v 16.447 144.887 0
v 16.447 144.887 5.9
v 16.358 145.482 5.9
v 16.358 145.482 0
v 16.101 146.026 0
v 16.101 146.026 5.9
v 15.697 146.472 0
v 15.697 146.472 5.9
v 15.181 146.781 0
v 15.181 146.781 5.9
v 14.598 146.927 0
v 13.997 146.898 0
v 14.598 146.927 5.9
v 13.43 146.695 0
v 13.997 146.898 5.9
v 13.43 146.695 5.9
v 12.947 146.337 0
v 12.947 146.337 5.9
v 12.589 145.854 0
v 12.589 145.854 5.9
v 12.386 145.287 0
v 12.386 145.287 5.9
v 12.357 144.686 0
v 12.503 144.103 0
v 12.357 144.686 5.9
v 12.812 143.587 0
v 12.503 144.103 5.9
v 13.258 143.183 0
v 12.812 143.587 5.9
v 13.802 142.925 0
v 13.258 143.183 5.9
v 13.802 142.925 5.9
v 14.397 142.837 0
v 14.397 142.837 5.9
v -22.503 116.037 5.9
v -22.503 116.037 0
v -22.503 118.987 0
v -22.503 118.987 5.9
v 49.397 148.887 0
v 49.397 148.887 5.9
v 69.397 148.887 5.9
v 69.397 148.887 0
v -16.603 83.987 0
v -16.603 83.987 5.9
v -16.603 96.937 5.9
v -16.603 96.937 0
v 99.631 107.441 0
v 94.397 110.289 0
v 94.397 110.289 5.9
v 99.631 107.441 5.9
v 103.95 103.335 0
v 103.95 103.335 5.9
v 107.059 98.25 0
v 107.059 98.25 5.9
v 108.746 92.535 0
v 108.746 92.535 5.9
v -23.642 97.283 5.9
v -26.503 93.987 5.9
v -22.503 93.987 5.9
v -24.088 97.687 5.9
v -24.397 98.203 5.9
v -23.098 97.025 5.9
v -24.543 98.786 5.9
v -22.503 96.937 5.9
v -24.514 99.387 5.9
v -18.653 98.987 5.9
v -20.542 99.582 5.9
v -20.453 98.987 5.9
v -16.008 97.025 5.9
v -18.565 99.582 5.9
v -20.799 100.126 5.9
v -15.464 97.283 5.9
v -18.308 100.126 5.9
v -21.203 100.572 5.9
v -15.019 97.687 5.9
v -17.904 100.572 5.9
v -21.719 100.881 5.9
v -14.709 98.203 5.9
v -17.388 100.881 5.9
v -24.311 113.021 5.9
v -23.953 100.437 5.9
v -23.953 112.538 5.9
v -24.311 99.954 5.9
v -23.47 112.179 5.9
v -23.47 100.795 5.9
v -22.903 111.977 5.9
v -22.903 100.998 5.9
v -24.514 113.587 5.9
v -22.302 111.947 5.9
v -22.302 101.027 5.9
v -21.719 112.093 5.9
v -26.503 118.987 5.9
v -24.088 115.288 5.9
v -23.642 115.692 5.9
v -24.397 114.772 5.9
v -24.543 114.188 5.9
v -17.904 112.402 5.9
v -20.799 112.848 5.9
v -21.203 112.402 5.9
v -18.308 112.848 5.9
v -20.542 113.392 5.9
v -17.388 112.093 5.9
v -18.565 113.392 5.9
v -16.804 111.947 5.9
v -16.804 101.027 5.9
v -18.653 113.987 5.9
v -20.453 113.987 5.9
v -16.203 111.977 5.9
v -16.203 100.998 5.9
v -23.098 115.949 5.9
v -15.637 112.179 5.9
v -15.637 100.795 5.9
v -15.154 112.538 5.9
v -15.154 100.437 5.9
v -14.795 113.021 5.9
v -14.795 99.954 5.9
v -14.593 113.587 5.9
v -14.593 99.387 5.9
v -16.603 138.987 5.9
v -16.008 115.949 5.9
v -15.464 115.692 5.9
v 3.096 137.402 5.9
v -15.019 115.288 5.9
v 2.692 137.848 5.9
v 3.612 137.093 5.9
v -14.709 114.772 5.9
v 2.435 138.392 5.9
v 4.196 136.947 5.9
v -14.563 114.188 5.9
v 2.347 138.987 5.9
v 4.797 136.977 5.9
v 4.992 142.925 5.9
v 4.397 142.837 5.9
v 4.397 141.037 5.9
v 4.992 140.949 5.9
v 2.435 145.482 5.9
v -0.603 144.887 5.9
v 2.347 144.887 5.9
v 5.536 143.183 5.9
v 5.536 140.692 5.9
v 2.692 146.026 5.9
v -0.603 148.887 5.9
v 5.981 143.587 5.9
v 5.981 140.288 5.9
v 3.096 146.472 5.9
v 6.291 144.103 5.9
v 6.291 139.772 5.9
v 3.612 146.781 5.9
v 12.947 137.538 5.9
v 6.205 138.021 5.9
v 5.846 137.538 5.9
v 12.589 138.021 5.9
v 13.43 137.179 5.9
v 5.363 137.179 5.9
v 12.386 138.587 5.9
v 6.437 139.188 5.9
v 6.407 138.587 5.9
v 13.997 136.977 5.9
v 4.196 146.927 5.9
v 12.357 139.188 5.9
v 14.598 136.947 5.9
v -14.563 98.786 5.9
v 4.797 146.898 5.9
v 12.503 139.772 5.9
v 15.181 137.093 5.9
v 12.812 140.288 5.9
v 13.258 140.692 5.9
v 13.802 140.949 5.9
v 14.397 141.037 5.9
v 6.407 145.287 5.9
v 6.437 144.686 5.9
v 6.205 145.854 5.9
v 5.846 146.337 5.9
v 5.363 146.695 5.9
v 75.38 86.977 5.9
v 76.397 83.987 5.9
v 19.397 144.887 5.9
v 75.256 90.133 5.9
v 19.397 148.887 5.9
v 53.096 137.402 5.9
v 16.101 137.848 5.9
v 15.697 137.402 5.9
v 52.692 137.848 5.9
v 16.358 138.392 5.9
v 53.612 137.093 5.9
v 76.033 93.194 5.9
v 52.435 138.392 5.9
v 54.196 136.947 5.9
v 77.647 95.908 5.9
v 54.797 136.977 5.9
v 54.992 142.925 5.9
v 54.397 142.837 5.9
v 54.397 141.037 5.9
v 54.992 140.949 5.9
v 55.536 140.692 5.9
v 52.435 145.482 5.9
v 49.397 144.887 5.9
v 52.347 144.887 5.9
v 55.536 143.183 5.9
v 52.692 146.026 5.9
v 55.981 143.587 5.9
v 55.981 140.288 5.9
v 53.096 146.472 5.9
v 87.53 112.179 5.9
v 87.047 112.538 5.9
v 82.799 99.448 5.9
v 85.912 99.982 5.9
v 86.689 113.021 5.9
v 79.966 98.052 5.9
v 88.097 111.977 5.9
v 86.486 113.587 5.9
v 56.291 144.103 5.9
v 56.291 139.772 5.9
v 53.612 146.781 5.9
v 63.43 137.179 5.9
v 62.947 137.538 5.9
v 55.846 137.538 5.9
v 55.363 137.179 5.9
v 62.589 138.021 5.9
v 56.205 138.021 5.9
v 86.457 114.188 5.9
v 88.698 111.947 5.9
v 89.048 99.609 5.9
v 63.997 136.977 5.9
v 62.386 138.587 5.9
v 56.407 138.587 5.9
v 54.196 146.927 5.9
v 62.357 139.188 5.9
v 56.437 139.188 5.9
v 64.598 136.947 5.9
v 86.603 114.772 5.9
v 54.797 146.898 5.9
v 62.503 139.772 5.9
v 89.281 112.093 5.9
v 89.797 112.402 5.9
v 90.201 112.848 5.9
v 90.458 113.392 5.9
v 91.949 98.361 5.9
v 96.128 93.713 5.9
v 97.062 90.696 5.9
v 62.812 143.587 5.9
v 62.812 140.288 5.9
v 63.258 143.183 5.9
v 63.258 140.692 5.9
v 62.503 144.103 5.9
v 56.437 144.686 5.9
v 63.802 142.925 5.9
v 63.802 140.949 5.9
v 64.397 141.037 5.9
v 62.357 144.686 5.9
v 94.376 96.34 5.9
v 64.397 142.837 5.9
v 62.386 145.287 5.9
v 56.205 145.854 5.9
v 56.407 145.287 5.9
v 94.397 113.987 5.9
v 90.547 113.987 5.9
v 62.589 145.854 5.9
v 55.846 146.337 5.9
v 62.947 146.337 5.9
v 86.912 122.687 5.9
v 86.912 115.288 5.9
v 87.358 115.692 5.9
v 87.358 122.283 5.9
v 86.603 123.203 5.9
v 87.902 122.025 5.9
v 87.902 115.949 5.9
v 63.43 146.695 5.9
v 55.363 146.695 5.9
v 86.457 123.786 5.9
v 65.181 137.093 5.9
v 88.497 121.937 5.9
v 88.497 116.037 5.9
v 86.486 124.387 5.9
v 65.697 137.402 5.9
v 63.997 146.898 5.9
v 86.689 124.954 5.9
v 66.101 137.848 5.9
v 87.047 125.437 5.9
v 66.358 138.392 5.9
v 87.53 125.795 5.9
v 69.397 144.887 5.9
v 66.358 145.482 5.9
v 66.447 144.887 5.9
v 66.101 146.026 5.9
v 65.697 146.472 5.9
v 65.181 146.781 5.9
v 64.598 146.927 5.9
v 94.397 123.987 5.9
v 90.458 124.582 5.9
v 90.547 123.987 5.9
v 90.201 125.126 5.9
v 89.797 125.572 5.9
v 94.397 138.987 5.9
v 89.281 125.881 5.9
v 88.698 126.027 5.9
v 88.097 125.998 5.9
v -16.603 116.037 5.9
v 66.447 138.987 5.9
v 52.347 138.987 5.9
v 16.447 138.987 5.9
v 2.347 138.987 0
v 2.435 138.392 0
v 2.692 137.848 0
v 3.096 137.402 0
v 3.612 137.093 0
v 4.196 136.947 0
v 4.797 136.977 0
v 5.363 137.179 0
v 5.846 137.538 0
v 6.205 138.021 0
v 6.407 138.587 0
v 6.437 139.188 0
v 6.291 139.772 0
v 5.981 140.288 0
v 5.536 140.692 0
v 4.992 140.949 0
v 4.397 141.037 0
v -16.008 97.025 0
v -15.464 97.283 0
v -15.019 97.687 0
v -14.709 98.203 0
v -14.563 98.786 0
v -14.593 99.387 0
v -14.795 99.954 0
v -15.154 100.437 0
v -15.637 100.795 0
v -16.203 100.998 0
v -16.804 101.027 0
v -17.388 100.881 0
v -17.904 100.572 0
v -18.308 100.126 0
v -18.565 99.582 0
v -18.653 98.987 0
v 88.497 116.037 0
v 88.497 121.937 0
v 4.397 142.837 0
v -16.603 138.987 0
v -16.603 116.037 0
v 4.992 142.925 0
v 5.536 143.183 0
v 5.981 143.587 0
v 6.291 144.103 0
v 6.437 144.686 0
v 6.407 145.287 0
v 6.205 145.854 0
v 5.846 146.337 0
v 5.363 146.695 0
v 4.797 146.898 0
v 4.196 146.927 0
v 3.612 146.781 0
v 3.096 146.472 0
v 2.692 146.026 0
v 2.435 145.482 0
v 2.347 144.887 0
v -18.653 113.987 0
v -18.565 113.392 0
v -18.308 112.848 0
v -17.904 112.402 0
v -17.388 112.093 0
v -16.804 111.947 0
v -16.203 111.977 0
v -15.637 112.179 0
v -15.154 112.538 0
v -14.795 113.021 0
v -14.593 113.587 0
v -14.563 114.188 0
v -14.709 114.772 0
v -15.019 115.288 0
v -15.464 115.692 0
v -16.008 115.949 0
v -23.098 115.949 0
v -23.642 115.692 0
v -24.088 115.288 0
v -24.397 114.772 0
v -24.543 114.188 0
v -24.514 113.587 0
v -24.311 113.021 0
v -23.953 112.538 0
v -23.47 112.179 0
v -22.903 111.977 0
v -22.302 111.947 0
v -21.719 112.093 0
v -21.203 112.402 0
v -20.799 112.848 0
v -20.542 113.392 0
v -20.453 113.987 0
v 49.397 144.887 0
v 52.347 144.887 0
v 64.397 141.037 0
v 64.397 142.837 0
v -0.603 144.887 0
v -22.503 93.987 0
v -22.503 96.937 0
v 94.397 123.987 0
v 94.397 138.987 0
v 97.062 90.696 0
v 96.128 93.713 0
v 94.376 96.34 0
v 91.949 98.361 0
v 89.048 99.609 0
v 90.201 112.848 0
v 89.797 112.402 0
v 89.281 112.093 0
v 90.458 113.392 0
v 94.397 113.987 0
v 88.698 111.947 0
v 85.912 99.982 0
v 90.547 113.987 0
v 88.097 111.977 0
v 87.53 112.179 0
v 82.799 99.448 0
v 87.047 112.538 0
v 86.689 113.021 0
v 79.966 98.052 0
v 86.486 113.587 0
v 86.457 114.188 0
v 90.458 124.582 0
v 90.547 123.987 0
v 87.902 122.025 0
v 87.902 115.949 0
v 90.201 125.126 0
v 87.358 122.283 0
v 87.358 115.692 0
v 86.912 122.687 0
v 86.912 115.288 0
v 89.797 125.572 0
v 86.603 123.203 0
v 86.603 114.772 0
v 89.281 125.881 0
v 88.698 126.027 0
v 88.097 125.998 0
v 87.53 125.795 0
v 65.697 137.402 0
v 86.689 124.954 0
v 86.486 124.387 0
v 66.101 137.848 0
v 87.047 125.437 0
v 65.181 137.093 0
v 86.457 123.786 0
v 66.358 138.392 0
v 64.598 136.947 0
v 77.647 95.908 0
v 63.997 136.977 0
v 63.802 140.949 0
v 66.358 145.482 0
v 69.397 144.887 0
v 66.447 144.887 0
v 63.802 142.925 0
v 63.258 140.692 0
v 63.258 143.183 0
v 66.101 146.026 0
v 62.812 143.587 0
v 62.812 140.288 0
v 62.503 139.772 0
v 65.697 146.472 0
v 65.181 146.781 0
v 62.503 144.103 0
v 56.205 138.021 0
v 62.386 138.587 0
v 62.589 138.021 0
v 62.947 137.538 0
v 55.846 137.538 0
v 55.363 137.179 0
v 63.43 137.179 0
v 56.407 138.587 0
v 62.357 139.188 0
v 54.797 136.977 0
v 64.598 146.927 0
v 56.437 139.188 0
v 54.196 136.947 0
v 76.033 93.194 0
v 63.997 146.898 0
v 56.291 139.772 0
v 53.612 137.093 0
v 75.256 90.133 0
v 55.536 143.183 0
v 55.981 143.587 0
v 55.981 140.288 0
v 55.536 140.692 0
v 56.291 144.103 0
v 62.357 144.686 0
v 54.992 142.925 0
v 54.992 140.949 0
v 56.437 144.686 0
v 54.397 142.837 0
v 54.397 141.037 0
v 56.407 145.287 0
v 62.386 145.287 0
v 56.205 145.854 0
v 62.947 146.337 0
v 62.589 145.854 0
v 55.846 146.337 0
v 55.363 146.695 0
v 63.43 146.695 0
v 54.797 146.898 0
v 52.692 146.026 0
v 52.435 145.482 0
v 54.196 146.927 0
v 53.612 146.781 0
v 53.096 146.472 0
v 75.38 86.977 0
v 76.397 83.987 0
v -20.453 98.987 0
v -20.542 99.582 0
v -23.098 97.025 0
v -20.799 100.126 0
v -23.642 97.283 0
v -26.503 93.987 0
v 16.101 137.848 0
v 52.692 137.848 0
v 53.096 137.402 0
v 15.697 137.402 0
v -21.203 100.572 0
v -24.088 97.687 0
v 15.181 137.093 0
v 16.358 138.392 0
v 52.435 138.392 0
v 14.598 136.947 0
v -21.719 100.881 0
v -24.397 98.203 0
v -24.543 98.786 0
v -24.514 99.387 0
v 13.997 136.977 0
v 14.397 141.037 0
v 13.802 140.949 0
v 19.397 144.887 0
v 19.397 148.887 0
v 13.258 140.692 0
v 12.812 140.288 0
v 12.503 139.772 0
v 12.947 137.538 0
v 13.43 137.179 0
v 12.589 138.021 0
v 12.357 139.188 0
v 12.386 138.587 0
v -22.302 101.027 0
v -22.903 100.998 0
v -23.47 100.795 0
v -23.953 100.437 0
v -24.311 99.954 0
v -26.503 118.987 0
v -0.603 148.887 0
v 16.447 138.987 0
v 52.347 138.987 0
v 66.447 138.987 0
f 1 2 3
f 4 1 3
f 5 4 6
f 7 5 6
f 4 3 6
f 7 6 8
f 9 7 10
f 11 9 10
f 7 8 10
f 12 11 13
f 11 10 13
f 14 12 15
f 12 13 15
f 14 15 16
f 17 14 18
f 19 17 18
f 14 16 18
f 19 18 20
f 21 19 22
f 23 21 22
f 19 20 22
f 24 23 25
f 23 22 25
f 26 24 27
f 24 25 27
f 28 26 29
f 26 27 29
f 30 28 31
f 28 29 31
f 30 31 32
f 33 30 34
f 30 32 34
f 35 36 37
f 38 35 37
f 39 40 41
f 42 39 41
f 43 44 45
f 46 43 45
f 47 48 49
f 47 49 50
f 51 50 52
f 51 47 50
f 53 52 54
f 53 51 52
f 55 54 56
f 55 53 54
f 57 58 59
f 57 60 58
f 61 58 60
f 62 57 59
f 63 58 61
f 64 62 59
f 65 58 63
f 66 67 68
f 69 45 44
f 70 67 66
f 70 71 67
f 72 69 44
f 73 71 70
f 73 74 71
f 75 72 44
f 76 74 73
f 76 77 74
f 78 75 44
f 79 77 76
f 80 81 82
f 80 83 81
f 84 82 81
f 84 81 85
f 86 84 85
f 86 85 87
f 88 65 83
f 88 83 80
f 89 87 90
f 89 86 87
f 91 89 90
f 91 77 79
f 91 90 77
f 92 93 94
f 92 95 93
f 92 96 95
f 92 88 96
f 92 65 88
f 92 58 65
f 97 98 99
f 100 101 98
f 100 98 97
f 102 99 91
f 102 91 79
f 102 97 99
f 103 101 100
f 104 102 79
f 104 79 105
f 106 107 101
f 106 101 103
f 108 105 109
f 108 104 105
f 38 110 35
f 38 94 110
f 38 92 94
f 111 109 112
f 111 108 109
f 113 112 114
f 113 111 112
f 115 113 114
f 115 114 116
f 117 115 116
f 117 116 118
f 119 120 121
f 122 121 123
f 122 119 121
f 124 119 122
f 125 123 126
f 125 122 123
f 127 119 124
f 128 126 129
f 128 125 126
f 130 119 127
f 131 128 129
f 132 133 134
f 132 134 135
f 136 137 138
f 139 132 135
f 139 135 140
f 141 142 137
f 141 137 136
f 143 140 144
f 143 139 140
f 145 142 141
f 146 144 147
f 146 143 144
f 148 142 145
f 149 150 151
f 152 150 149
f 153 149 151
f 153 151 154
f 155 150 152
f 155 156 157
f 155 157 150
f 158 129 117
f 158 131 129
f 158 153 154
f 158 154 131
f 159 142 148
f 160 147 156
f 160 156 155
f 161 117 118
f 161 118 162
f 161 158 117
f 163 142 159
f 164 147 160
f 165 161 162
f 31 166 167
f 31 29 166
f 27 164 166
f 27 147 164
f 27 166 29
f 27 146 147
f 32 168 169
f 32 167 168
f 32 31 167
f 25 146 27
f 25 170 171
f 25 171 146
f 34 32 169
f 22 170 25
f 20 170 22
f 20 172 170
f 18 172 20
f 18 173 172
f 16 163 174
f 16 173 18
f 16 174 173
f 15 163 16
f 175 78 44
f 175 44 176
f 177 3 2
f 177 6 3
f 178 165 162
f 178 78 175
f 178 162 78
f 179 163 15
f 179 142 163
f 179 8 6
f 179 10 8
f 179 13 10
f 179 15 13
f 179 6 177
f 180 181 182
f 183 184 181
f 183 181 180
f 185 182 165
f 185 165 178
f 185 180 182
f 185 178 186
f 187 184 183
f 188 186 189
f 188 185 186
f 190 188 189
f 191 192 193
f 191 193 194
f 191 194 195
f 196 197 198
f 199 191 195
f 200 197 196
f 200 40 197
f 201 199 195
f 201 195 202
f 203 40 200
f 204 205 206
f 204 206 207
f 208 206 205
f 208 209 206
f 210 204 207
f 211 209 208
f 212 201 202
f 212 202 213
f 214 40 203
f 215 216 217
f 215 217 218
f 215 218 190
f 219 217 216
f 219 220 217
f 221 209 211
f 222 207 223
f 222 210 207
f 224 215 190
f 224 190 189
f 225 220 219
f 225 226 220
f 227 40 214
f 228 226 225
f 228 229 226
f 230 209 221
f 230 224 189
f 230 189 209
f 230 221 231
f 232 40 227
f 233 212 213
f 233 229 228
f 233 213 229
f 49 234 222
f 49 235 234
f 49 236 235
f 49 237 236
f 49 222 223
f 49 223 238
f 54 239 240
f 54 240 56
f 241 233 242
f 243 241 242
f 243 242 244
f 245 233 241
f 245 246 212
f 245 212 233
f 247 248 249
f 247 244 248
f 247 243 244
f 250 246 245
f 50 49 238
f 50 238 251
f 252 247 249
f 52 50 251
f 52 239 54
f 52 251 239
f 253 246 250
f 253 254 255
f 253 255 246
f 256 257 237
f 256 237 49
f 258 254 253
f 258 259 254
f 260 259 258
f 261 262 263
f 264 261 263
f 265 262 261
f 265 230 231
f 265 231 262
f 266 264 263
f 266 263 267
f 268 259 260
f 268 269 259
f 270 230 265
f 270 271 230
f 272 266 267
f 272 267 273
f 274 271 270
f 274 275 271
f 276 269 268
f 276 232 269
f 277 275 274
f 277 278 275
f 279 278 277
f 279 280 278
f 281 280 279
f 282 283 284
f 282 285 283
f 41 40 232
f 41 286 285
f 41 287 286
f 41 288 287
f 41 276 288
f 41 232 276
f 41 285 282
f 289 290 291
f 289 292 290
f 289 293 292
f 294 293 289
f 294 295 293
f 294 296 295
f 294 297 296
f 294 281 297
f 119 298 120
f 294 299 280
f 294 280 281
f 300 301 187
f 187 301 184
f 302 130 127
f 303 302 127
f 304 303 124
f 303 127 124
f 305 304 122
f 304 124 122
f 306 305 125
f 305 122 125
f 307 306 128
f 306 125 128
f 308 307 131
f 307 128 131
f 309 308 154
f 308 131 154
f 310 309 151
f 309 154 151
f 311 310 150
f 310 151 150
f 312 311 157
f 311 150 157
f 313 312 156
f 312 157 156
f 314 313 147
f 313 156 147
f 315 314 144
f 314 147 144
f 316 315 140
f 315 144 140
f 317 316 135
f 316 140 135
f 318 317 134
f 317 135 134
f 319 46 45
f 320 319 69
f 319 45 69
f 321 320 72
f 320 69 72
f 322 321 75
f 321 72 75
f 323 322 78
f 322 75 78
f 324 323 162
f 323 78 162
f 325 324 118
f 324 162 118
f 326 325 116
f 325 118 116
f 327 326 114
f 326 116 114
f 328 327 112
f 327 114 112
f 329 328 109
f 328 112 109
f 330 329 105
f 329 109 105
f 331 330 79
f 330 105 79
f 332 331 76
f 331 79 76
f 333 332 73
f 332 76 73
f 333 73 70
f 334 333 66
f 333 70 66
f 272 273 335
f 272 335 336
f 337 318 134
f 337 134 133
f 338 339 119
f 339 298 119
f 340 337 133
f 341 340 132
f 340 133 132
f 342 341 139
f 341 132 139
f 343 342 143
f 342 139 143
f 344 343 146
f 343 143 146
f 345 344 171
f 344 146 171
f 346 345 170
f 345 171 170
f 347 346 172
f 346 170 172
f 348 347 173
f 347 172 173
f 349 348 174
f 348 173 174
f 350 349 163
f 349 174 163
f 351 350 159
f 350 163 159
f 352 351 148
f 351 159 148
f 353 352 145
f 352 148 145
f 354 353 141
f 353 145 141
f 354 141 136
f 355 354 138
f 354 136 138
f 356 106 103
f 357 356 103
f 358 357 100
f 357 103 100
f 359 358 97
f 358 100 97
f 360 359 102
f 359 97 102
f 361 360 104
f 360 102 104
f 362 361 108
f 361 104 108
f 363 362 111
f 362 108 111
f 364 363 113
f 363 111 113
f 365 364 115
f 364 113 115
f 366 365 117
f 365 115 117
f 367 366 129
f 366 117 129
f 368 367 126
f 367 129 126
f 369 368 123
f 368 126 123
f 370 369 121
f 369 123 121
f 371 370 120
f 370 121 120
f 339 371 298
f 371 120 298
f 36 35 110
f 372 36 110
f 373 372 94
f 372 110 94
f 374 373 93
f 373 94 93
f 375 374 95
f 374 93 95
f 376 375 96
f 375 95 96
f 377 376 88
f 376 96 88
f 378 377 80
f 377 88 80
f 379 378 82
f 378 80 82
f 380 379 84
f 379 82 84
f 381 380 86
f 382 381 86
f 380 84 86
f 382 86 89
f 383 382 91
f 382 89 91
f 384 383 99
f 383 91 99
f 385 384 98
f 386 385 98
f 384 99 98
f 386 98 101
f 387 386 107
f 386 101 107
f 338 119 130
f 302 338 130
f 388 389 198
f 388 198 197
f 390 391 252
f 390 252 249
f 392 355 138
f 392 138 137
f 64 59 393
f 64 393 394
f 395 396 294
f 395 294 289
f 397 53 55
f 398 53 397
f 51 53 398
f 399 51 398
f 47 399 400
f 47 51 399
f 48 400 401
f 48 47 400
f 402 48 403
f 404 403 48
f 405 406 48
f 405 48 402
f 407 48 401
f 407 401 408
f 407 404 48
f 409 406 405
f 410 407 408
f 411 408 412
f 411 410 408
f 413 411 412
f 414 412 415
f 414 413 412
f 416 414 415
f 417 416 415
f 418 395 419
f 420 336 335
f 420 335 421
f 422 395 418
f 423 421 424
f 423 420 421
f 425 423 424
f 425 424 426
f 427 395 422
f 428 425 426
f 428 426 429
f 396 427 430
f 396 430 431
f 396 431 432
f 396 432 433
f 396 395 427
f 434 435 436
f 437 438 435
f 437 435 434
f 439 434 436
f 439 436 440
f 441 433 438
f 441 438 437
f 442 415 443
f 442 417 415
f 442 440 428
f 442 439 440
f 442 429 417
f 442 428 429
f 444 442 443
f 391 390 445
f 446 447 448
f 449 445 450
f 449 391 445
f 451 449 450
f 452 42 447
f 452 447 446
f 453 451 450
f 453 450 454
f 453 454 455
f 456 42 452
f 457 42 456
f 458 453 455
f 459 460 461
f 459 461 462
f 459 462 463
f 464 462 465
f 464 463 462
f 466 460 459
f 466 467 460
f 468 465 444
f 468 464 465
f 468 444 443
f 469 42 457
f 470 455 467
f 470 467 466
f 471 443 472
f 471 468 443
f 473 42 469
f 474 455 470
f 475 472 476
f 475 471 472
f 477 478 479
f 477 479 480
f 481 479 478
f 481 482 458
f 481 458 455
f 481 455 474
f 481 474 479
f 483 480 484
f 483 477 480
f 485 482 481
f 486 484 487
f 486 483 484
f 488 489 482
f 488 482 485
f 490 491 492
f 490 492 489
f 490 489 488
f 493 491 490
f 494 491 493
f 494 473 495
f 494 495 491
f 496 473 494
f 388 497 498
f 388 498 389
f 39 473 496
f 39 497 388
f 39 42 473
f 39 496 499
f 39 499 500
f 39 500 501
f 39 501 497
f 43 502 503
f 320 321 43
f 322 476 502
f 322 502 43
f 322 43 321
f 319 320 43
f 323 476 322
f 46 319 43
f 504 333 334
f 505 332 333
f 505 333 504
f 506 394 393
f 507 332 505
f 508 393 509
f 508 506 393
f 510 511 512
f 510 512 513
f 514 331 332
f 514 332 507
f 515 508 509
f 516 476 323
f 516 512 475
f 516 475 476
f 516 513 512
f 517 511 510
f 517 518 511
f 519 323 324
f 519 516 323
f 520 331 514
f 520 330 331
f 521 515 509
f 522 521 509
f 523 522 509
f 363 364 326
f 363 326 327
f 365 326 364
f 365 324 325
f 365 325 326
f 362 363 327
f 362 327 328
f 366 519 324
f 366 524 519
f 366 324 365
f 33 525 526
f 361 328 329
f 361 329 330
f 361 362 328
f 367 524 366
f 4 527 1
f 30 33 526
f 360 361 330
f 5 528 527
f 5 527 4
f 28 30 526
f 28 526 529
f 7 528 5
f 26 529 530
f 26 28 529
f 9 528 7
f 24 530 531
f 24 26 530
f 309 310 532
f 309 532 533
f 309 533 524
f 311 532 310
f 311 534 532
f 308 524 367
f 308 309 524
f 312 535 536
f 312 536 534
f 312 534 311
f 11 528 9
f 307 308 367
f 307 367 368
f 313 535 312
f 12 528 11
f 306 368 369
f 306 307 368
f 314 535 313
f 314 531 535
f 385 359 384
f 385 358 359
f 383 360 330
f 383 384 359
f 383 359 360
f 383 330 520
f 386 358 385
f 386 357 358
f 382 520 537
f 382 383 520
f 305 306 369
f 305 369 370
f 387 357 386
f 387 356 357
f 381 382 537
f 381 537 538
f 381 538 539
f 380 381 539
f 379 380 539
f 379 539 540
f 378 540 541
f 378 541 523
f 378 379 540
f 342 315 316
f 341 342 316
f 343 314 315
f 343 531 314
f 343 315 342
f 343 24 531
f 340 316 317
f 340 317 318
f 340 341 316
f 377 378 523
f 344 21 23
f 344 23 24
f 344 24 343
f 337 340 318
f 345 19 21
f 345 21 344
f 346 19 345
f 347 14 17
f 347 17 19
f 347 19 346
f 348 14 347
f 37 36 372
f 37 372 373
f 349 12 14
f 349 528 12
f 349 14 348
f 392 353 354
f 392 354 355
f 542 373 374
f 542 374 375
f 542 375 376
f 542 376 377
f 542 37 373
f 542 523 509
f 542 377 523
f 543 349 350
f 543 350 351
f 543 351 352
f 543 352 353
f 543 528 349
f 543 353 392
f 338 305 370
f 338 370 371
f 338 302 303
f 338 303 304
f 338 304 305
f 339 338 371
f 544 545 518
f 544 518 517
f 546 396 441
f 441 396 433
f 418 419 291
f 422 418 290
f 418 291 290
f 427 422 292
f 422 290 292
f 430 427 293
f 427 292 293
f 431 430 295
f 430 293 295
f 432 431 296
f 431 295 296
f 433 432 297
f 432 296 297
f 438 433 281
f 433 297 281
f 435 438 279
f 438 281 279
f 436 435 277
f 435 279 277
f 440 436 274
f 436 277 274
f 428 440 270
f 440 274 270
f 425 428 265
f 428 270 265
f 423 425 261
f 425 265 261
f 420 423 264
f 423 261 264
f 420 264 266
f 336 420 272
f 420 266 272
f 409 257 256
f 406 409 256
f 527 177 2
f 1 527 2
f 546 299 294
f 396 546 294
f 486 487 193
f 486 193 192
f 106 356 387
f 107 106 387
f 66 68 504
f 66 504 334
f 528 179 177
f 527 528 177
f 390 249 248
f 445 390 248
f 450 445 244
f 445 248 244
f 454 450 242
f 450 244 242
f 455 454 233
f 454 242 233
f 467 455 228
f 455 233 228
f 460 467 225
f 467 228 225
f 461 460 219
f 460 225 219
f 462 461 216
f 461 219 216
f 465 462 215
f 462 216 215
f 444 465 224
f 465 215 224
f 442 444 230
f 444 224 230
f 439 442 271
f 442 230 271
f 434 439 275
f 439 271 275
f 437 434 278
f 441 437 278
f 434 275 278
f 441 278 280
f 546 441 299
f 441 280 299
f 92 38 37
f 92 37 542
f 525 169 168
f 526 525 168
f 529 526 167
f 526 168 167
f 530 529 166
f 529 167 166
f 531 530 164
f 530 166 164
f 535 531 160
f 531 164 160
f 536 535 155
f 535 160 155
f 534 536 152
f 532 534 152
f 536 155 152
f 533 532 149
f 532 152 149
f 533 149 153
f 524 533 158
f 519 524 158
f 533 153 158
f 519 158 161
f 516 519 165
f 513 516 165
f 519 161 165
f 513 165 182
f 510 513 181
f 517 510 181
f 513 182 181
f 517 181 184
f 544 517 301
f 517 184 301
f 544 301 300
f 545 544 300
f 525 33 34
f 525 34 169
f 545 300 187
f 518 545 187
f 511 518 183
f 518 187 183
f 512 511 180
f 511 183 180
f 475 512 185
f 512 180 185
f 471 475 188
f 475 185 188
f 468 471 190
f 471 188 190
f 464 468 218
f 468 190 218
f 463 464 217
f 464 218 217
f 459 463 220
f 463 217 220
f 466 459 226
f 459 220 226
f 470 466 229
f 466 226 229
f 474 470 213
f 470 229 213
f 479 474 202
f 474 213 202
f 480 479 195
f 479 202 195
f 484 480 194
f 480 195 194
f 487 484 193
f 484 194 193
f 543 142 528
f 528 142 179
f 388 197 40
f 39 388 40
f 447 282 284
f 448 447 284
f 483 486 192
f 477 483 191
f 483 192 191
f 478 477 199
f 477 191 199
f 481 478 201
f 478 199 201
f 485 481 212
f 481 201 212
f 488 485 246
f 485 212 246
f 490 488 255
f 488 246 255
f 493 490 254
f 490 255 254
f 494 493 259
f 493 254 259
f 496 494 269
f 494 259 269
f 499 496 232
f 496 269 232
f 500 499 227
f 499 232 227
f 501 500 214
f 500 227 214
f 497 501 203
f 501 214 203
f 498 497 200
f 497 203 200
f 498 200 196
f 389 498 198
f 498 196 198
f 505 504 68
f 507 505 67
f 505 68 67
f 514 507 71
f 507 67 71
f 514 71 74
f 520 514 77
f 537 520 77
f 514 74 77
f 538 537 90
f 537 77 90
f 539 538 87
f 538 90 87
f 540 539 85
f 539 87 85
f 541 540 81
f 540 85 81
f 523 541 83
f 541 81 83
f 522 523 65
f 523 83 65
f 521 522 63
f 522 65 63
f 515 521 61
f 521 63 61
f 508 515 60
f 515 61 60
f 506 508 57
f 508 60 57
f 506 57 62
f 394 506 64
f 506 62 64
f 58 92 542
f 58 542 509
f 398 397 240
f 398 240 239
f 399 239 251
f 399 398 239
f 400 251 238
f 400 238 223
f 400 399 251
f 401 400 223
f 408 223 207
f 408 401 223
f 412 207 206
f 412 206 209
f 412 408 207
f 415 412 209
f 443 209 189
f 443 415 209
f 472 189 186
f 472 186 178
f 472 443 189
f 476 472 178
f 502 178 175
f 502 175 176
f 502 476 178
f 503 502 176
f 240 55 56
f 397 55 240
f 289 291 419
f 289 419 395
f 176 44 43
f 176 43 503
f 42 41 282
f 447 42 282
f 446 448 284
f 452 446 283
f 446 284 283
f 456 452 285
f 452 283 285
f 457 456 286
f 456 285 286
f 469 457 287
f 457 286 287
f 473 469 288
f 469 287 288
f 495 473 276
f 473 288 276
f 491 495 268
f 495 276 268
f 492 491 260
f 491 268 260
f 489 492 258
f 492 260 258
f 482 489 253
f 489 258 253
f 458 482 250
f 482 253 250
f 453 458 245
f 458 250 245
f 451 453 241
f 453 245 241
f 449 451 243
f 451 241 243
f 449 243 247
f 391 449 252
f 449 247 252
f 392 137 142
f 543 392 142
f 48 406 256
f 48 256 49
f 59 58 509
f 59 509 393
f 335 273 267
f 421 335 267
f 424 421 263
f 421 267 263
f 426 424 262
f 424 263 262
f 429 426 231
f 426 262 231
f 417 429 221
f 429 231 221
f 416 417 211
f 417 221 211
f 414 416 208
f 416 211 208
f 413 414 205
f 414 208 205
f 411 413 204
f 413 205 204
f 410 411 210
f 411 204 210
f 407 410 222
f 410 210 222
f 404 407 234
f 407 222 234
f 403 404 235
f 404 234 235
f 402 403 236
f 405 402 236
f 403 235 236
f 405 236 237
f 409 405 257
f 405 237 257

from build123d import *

# Parameters (mm, degrees)
BOSS_EXTRUDE1_DEPTH = 5.9
SKETCH2_W           = 8
SKETCH2_H           = 55
BOSS_EXTRUDE2_DEPTH = 8
SKETCH3_W           = 5.9
SKETCH3_H           = 10
SKETCH3_W_2         = 9
SKETCH3_H_2         = 15
CUT_EXTRUDE1_DEPTH  = 9
BOSS_EXTRUDE3_DEPTH = 5.9
BOSS_EXTRUDE4_DEPTH = 8
SKETCH6_W           = 27.583097586
SKETCH6_H           = 68.456340366
CUT_EXTRUDE2_DEPTH  = 9
BOSS_EXTRUDE5_DEPTH = 5.9
CUT_EXTRUDE3_REACH  = 7.9
SKETCH8_R           = 2.05


with BuildPart() as part:
    # Sketch1 → Boss-Extrude1 (new body)
    with BuildSketch(Plane.XY):
        with BuildLine():
            ThreePointArc((97.061822228, 90.695765473), (82.799132124, 99.447826237), (76.396720763, 83.987165662))
            Line((76.396720763, 83.987165662), (-17.603279237, 83.987165662))
            Line((-17.603279237, 83.987165662), (-17.603279237, 138.987165662))
            Line((-17.603279237, 138.987165662), (94.396720763, 138.987165662))
            Line((94.396720763, 138.987165662), (94.396720763, 110.289306386))
            ThreePointArc((94.396720763, 110.289306386), (103.949970876, 103.334562845), (108.745956392, 92.534953205))
            Line((108.745956392, 92.534953205), (97.061822228, 90.695765473))
        make_face()
    extrude(amount=BOSS_EXTRUDE1_DEPTH)

    # Sketch2 → Boss-Extrude2 (add)
    with BuildSketch(Plane.XY.offset(5.9)):
        with Locations((-21.603279237, 111.487165662)):
            Rectangle(SKETCH2_W, SKETCH2_H)
    extrude(amount=-BOSS_EXTRUDE2_DEPTH)

    # Sketch3 → Cut-Extrude1 (cut, through all)
    with BuildSketch(Plane.XY.offset(5.9)):
        with Locations((91.446720763, 118.987165662)):
            Rectangle(SKETCH3_W, SKETCH3_H)
        with Locations((-21.103279237, 91.487165662)):
            Rectangle(SKETCH3_W_2, SKETCH3_H_2)
    extrude(amount=-CUT_EXTRUDE1_DEPTH, mode=Mode.SUBTRACT)

    # Sketch4 → Boss-Extrude3 (add)
    with BuildSketch(Plane.XY.offset(5.9)):
        Polygon((4.396720763, 138.987165662), (4.396720763, 144.887165662), (-0.603279237, 144.887165662), (-0.603279237, 148.887165662), (19.396720763, 148.887165662), (19.396720763, 144.887165662), (14.396720763, 144.887165662), (14.396720763, 138.987165662), align=None)
        Polygon((49.396720763, 144.887165662), (49.396720763, 148.887165662), (69.396720763, 148.887165662), (69.396720763, 144.887165662), (64.396720763, 144.887165662), (64.396720763, 138.987165662), (54.396720763, 138.987165662), (54.396720763, 144.887165662), align=None)
    extrude(amount=-BOSS_EXTRUDE3_DEPTH)

    # Sketch5 → Boss-Extrude4 (add, through all)
    with BuildSketch(Plane.XY.offset(5.9)):
        Polygon((-25.603279237, 123.987165662), (-33.603279237, 123.987165662), (-33.603279237, 128.987165662), (-37.603279237, 128.987165662), (-37.603279237, 103.987165662), (-33.603279237, 103.987165662), (-33.603279237, 108.987165662), (-25.603279237, 108.987165662), align=None)
    extrude(amount=-BOSS_EXTRUDE4_DEPTH)

    # Sketch6 → Cut-Extrude2 (cut, through all)
    with BuildSketch(Plane.XY.offset(5.9)):
        with Locations((-30.39482803, 118.215335845)):
            Rectangle(SKETCH6_W, SKETCH6_H)
    extrude(amount=-CUT_EXTRUDE2_DEPTH, mode=Mode.SUBTRACT)

    # Sketch7 → Boss-Extrude5 (add)
    with BuildSketch(Plane.XY.offset(5.9)):
        Polygon((-16.603279237, 113.987165662), (-22.503279237, 113.987165662), (-22.503279237, 118.987165662), (-26.503279237, 118.987165662), (-26.503279237, 93.987165662), (-22.503279237, 93.987165662), (-22.503279237, 98.987165662), (-16.603279237, 98.987165662), align=None)
    extrude(amount=-BOSS_EXTRUDE5_DEPTH)

    # Sketch8 → Cut-Extrude3 (cut, up to next)
    with BuildSketch(Plane.XY.offset(5.9), mode=Mode.PRIVATE) as cut_extrude3_sk1:
        with Locations((-16.603279237, 98.987165662)):
            Circle(SKETCH8_R)
    cut_extrude3_tool1 = extrude(cut_extrude3_sk1.sketch, amount=-CUT_EXTRUDE3_REACH, mode=Mode.PRIVATE) & part.part
    add(cut_extrude3_tool1.solids().sort_by_distance((-16.603279, 98.987166, 5.9))[0], mode=Mode.SUBTRACT)
    # Sketch8 → Cut-Extrude3 (cut, up to next)
    with BuildSketch(Plane.XY.offset(5.9), mode=Mode.PRIVATE) as cut_extrude3_sk2:
        with Locations((-22.503279237, 98.987165662)):
            Circle(SKETCH8_R)
    cut_extrude3_tool2 = extrude(cut_extrude3_sk2.sketch, amount=-CUT_EXTRUDE3_REACH, mode=Mode.PRIVATE) & part.part
    add(cut_extrude3_tool2.solids().sort_by_distance((-22.503279, 98.987166, 5.9))[0], mode=Mode.SUBTRACT)
    # Sketch8 → Cut-Extrude3 (cut, up to next)
    with BuildSketch(Plane.XY.offset(5.9), mode=Mode.PRIVATE) as cut_extrude3_sk3:
        with Locations((-22.503279237, 113.987165662)):
            Circle(SKETCH8_R)
    cut_extrude3_tool3 = extrude(cut_extrude3_sk3.sketch, amount=-CUT_EXTRUDE3_REACH, mode=Mode.PRIVATE) & part.part
    add(cut_extrude3_tool3.solids().sort_by_distance((-22.503279, 113.987166, 5.9))[0], mode=Mode.SUBTRACT)
    # Sketch8 → Cut-Extrude3 (cut, up to next)
    with BuildSketch(Plane.XY.offset(5.9), mode=Mode.PRIVATE) as cut_extrude3_sk4:
        with Locations((-16.603279237, 113.987165662)):
            Circle(SKETCH8_R)
    cut_extrude3_tool4 = extrude(cut_extrude3_sk4.sketch, amount=-CUT_EXTRUDE3_REACH, mode=Mode.PRIVATE) & part.part
    add(cut_extrude3_tool4.solids().sort_by_distance((-16.603279, 113.987166, 5.9))[0], mode=Mode.SUBTRACT)
    # Sketch8 → Cut-Extrude3 (cut, up to next)
    with BuildSketch(Plane.XY.offset(5.9), mode=Mode.PRIVATE) as cut_extrude3_sk5:
        with Locations((4.396720763, 138.987165662)):
            Circle(SKETCH8_R)
    cut_extrude3_tool5 = extrude(cut_extrude3_sk5.sketch, amount=-CUT_EXTRUDE3_REACH, mode=Mode.PRIVATE) & part.part
    add(cut_extrude3_tool5.solids().sort_by_distance((4.396721, 138.987166, 5.9))[0], mode=Mode.SUBTRACT)
    # Sketch8 → Cut-Extrude3 (cut, up to next)
    with BuildSketch(Plane.XY.offset(5.9), mode=Mode.PRIVATE) as cut_extrude3_sk6:
        with Locations((14.396720763, 138.987165662)):
            Circle(SKETCH8_R)
    cut_extrude3_tool6 = extrude(cut_extrude3_sk6.sketch, amount=-CUT_EXTRUDE3_REACH, mode=Mode.PRIVATE) & part.part
    add(cut_extrude3_tool6.solids().sort_by_distance((14.396721, 138.987166, 5.9))[0], mode=Mode.SUBTRACT)
    # Sketch8 → Cut-Extrude3 (cut, up to next)
    with BuildSketch(Plane.XY.offset(5.9), mode=Mode.PRIVATE) as cut_extrude3_sk7:
        with Locations((14.396720763, 144.887165662)):
            Circle(SKETCH8_R)
    cut_extrude3_tool7 = extrude(cut_extrude3_sk7.sketch, amount=-CUT_EXTRUDE3_REACH, mode=Mode.PRIVATE) & part.part
    add(cut_extrude3_tool7.solids().sort_by_distance((14.396721, 144.887166, 5.9))[0], mode=Mode.SUBTRACT)
    # Sketch8 → Cut-Extrude3 (cut, up to next)
    with BuildSketch(Plane.XY.offset(5.9), mode=Mode.PRIVATE) as cut_extrude3_sk8:
        with Locations((4.396720763, 144.887165662)):
            Circle(SKETCH8_R)
    cut_extrude3_tool8 = extrude(cut_extrude3_sk8.sketch, amount=-CUT_EXTRUDE3_REACH, mode=Mode.PRIVATE) & part.part
    add(cut_extrude3_tool8.solids().sort_by_distance((4.396721, 144.887166, 5.9))[0], mode=Mode.SUBTRACT)
    # Sketch8 → Cut-Extrude3 (cut, up to next)
    with BuildSketch(Plane.XY.offset(5.9), mode=Mode.PRIVATE) as cut_extrude3_sk9:
        with Locations((54.396720763, 144.887165662)):
            Circle(SKETCH8_R)
    cut_extrude3_tool9 = extrude(cut_extrude3_sk9.sketch, amount=-CUT_EXTRUDE3_REACH, mode=Mode.PRIVATE) & part.part
    add(cut_extrude3_tool9.solids().sort_by_distance((54.396721, 144.887166, 5.9))[0], mode=Mode.SUBTRACT)
    # Sketch8 → Cut-Extrude3 (cut, up to next)
    with BuildSketch(Plane.XY.offset(5.9), mode=Mode.PRIVATE) as cut_extrude3_sk10:
        with Locations((54.396720763, 138.987165662)):
            Circle(SKETCH8_R)
    cut_extrude3_tool10 = extrude(cut_extrude3_sk10.sketch, amount=-CUT_EXTRUDE3_REACH, mode=Mode.PRIVATE) & part.part
    add(cut_extrude3_tool10.solids().sort_by_distance((54.396721, 138.987166, 5.9))[0], mode=Mode.SUBTRACT)
    # Sketch8 → Cut-Extrude3 (cut, up to next)
    with BuildSketch(Plane.XY.offset(5.9), mode=Mode.PRIVATE) as cut_extrude3_sk11:
        with Locations((64.396720763, 138.987165662)):
            Circle(SKETCH8_R)
    cut_extrude3_tool11 = extrude(cut_extrude3_sk11.sketch, amount=-CUT_EXTRUDE3_REACH, mode=Mode.PRIVATE) & part.part
    add(cut_extrude3_tool11.solids().sort_by_distance((64.396721, 138.987166, 5.9))[0], mode=Mode.SUBTRACT)
    # Sketch8 → Cut-Extrude3 (cut, up to next)
    with BuildSketch(Plane.XY.offset(5.9), mode=Mode.PRIVATE) as cut_extrude3_sk12:
        with Locations((64.396720763, 144.887165662)):
            Circle(SKETCH8_R)
    cut_extrude3_tool12 = extrude(cut_extrude3_sk12.sketch, amount=-CUT_EXTRUDE3_REACH, mode=Mode.PRIVATE) & part.part
    add(cut_extrude3_tool12.solids().sort_by_distance((64.396721, 144.887166, 5.9))[0], mode=Mode.SUBTRACT)
    # Sketch8 → Cut-Extrude3 (cut, up to next)
    with BuildSketch(Plane.XY.offset(5.9), mode=Mode.PRIVATE) as cut_extrude3_sk13:
        with Locations((88.496720763, 123.987165662)):
            Circle(SKETCH8_R)
    cut_extrude3_tool13 = extrude(cut_extrude3_sk13.sketch, amount=-CUT_EXTRUDE3_REACH, mode=Mode.PRIVATE) & part.part
    add(cut_extrude3_tool13.solids().sort_by_distance((88.496721, 123.987166, 5.9))[0], mode=Mode.SUBTRACT)
    # Sketch8 → Cut-Extrude3 (cut, up to next)
    with BuildSketch(Plane.XY.offset(5.9), mode=Mode.PRIVATE) as cut_extrude3_sk14:
        with Locations((88.496720763, 113.987165662)):
            Circle(SKETCH8_R)
    cut_extrude3_tool14 = extrude(cut_extrude3_sk14.sketch, amount=-CUT_EXTRUDE3_REACH, mode=Mode.PRIVATE) & part.part
    add(cut_extrude3_tool14.solids().sort_by_distance((88.496721, 113.987166, 5.9))[0], mode=Mode.SUBTRACT)


solid = part.part
